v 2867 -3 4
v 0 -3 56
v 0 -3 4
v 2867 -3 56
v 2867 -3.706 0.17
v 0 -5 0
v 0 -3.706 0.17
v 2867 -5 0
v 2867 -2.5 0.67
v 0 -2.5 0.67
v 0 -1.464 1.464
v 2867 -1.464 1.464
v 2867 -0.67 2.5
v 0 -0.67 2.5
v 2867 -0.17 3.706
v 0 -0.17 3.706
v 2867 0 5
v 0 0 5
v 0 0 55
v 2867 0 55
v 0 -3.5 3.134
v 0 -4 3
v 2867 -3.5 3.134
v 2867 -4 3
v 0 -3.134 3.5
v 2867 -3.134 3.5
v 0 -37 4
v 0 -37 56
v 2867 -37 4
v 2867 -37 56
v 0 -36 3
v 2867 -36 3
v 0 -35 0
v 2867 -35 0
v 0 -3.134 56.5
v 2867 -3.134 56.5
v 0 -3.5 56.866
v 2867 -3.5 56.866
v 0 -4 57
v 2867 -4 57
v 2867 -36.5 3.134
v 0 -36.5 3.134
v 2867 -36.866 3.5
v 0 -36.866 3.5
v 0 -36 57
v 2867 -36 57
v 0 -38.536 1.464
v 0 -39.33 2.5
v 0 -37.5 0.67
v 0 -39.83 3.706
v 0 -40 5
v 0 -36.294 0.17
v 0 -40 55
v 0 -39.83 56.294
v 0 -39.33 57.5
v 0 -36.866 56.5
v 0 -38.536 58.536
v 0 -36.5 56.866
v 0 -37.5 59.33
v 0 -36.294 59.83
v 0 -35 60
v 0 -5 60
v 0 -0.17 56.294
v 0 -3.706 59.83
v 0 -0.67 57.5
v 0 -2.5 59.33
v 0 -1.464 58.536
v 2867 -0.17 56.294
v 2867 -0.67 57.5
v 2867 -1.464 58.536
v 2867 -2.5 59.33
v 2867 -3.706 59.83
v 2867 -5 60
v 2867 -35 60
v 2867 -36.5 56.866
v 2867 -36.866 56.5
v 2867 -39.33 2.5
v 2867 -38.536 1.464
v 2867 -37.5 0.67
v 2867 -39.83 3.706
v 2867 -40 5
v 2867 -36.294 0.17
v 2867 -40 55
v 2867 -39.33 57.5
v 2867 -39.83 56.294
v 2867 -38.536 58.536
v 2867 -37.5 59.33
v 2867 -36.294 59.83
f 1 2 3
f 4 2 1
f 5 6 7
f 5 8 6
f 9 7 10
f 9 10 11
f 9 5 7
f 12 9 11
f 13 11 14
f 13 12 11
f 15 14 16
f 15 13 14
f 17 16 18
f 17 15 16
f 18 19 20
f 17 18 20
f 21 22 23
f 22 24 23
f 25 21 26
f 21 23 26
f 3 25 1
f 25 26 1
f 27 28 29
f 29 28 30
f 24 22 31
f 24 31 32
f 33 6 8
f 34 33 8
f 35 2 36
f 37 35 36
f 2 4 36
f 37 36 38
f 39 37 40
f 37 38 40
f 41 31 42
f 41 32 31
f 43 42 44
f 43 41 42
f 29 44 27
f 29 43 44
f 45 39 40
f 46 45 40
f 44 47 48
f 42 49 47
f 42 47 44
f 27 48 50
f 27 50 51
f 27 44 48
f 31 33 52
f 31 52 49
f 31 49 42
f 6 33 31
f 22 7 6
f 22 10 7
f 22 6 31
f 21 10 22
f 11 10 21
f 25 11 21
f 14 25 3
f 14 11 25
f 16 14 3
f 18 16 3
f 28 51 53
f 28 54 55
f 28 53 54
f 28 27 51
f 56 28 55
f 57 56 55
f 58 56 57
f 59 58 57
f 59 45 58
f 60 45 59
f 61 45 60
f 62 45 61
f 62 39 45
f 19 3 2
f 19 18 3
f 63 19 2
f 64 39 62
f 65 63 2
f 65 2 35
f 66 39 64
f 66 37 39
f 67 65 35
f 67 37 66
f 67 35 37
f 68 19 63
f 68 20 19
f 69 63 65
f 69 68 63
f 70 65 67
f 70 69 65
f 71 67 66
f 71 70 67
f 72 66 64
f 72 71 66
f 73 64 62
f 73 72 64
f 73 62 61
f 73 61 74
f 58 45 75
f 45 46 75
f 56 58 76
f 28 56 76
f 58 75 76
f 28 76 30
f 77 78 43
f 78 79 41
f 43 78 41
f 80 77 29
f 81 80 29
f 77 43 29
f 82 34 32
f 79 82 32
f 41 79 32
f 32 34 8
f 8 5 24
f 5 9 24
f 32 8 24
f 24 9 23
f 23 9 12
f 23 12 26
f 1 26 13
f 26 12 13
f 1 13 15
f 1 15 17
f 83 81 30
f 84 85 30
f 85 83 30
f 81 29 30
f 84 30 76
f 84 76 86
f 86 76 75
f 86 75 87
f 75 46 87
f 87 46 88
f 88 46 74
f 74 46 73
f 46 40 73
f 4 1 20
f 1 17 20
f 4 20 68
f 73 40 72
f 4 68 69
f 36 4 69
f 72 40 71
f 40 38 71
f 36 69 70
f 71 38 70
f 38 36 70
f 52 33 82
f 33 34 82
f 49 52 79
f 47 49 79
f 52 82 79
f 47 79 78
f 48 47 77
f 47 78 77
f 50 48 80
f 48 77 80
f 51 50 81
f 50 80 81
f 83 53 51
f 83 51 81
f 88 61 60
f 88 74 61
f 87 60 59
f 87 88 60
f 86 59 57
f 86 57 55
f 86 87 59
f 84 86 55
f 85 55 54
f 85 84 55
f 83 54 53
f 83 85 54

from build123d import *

# Parameters (mm, degrees)
F0_W     = 2867
F0_H     = 60
F1_DEPTH = 40
F2_T     = -3
F3_R     = 5
F4_R     = 1


with BuildPart() as f1:
    # F0 (on Front) → F1 (new body)
    with BuildSketch(Plane.XZ):
        with Locations((1433.5, 30)):
            Rectangle(F0_W, F0_H)
    extrude(amount=F1_DEPTH)

    # F2
    f2_openings = [f1.faces().sort_by_distance(p)[0] for p in [
        (0, -20, 30),
        (2867, -20, 30),
    ]]
    offset(amount=F2_T, openings=f2_openings)

    # F3
    f3_edges = [f1.edges().sort_by_distance(p)[0] for p in [
        (1433.5, -40, 60),
        (1433.5, -40, 0),
        (1433.5, 0, 0),
        (1433.5, 0, 60),
    ]]
    fillet(f3_edges, radius=F3_R)

    # F4
    f4_edges = [f1.edges().sort_by_distance(p)[0] for p in [
        (1433.5, -3, 3),
        (1433.5, -37, 3),
        (1433.5, -3, 57),
        (1433.5, -37, 57),
    ]]
    fillet(f4_edges, radius=F4_R)


solid = f1.part
